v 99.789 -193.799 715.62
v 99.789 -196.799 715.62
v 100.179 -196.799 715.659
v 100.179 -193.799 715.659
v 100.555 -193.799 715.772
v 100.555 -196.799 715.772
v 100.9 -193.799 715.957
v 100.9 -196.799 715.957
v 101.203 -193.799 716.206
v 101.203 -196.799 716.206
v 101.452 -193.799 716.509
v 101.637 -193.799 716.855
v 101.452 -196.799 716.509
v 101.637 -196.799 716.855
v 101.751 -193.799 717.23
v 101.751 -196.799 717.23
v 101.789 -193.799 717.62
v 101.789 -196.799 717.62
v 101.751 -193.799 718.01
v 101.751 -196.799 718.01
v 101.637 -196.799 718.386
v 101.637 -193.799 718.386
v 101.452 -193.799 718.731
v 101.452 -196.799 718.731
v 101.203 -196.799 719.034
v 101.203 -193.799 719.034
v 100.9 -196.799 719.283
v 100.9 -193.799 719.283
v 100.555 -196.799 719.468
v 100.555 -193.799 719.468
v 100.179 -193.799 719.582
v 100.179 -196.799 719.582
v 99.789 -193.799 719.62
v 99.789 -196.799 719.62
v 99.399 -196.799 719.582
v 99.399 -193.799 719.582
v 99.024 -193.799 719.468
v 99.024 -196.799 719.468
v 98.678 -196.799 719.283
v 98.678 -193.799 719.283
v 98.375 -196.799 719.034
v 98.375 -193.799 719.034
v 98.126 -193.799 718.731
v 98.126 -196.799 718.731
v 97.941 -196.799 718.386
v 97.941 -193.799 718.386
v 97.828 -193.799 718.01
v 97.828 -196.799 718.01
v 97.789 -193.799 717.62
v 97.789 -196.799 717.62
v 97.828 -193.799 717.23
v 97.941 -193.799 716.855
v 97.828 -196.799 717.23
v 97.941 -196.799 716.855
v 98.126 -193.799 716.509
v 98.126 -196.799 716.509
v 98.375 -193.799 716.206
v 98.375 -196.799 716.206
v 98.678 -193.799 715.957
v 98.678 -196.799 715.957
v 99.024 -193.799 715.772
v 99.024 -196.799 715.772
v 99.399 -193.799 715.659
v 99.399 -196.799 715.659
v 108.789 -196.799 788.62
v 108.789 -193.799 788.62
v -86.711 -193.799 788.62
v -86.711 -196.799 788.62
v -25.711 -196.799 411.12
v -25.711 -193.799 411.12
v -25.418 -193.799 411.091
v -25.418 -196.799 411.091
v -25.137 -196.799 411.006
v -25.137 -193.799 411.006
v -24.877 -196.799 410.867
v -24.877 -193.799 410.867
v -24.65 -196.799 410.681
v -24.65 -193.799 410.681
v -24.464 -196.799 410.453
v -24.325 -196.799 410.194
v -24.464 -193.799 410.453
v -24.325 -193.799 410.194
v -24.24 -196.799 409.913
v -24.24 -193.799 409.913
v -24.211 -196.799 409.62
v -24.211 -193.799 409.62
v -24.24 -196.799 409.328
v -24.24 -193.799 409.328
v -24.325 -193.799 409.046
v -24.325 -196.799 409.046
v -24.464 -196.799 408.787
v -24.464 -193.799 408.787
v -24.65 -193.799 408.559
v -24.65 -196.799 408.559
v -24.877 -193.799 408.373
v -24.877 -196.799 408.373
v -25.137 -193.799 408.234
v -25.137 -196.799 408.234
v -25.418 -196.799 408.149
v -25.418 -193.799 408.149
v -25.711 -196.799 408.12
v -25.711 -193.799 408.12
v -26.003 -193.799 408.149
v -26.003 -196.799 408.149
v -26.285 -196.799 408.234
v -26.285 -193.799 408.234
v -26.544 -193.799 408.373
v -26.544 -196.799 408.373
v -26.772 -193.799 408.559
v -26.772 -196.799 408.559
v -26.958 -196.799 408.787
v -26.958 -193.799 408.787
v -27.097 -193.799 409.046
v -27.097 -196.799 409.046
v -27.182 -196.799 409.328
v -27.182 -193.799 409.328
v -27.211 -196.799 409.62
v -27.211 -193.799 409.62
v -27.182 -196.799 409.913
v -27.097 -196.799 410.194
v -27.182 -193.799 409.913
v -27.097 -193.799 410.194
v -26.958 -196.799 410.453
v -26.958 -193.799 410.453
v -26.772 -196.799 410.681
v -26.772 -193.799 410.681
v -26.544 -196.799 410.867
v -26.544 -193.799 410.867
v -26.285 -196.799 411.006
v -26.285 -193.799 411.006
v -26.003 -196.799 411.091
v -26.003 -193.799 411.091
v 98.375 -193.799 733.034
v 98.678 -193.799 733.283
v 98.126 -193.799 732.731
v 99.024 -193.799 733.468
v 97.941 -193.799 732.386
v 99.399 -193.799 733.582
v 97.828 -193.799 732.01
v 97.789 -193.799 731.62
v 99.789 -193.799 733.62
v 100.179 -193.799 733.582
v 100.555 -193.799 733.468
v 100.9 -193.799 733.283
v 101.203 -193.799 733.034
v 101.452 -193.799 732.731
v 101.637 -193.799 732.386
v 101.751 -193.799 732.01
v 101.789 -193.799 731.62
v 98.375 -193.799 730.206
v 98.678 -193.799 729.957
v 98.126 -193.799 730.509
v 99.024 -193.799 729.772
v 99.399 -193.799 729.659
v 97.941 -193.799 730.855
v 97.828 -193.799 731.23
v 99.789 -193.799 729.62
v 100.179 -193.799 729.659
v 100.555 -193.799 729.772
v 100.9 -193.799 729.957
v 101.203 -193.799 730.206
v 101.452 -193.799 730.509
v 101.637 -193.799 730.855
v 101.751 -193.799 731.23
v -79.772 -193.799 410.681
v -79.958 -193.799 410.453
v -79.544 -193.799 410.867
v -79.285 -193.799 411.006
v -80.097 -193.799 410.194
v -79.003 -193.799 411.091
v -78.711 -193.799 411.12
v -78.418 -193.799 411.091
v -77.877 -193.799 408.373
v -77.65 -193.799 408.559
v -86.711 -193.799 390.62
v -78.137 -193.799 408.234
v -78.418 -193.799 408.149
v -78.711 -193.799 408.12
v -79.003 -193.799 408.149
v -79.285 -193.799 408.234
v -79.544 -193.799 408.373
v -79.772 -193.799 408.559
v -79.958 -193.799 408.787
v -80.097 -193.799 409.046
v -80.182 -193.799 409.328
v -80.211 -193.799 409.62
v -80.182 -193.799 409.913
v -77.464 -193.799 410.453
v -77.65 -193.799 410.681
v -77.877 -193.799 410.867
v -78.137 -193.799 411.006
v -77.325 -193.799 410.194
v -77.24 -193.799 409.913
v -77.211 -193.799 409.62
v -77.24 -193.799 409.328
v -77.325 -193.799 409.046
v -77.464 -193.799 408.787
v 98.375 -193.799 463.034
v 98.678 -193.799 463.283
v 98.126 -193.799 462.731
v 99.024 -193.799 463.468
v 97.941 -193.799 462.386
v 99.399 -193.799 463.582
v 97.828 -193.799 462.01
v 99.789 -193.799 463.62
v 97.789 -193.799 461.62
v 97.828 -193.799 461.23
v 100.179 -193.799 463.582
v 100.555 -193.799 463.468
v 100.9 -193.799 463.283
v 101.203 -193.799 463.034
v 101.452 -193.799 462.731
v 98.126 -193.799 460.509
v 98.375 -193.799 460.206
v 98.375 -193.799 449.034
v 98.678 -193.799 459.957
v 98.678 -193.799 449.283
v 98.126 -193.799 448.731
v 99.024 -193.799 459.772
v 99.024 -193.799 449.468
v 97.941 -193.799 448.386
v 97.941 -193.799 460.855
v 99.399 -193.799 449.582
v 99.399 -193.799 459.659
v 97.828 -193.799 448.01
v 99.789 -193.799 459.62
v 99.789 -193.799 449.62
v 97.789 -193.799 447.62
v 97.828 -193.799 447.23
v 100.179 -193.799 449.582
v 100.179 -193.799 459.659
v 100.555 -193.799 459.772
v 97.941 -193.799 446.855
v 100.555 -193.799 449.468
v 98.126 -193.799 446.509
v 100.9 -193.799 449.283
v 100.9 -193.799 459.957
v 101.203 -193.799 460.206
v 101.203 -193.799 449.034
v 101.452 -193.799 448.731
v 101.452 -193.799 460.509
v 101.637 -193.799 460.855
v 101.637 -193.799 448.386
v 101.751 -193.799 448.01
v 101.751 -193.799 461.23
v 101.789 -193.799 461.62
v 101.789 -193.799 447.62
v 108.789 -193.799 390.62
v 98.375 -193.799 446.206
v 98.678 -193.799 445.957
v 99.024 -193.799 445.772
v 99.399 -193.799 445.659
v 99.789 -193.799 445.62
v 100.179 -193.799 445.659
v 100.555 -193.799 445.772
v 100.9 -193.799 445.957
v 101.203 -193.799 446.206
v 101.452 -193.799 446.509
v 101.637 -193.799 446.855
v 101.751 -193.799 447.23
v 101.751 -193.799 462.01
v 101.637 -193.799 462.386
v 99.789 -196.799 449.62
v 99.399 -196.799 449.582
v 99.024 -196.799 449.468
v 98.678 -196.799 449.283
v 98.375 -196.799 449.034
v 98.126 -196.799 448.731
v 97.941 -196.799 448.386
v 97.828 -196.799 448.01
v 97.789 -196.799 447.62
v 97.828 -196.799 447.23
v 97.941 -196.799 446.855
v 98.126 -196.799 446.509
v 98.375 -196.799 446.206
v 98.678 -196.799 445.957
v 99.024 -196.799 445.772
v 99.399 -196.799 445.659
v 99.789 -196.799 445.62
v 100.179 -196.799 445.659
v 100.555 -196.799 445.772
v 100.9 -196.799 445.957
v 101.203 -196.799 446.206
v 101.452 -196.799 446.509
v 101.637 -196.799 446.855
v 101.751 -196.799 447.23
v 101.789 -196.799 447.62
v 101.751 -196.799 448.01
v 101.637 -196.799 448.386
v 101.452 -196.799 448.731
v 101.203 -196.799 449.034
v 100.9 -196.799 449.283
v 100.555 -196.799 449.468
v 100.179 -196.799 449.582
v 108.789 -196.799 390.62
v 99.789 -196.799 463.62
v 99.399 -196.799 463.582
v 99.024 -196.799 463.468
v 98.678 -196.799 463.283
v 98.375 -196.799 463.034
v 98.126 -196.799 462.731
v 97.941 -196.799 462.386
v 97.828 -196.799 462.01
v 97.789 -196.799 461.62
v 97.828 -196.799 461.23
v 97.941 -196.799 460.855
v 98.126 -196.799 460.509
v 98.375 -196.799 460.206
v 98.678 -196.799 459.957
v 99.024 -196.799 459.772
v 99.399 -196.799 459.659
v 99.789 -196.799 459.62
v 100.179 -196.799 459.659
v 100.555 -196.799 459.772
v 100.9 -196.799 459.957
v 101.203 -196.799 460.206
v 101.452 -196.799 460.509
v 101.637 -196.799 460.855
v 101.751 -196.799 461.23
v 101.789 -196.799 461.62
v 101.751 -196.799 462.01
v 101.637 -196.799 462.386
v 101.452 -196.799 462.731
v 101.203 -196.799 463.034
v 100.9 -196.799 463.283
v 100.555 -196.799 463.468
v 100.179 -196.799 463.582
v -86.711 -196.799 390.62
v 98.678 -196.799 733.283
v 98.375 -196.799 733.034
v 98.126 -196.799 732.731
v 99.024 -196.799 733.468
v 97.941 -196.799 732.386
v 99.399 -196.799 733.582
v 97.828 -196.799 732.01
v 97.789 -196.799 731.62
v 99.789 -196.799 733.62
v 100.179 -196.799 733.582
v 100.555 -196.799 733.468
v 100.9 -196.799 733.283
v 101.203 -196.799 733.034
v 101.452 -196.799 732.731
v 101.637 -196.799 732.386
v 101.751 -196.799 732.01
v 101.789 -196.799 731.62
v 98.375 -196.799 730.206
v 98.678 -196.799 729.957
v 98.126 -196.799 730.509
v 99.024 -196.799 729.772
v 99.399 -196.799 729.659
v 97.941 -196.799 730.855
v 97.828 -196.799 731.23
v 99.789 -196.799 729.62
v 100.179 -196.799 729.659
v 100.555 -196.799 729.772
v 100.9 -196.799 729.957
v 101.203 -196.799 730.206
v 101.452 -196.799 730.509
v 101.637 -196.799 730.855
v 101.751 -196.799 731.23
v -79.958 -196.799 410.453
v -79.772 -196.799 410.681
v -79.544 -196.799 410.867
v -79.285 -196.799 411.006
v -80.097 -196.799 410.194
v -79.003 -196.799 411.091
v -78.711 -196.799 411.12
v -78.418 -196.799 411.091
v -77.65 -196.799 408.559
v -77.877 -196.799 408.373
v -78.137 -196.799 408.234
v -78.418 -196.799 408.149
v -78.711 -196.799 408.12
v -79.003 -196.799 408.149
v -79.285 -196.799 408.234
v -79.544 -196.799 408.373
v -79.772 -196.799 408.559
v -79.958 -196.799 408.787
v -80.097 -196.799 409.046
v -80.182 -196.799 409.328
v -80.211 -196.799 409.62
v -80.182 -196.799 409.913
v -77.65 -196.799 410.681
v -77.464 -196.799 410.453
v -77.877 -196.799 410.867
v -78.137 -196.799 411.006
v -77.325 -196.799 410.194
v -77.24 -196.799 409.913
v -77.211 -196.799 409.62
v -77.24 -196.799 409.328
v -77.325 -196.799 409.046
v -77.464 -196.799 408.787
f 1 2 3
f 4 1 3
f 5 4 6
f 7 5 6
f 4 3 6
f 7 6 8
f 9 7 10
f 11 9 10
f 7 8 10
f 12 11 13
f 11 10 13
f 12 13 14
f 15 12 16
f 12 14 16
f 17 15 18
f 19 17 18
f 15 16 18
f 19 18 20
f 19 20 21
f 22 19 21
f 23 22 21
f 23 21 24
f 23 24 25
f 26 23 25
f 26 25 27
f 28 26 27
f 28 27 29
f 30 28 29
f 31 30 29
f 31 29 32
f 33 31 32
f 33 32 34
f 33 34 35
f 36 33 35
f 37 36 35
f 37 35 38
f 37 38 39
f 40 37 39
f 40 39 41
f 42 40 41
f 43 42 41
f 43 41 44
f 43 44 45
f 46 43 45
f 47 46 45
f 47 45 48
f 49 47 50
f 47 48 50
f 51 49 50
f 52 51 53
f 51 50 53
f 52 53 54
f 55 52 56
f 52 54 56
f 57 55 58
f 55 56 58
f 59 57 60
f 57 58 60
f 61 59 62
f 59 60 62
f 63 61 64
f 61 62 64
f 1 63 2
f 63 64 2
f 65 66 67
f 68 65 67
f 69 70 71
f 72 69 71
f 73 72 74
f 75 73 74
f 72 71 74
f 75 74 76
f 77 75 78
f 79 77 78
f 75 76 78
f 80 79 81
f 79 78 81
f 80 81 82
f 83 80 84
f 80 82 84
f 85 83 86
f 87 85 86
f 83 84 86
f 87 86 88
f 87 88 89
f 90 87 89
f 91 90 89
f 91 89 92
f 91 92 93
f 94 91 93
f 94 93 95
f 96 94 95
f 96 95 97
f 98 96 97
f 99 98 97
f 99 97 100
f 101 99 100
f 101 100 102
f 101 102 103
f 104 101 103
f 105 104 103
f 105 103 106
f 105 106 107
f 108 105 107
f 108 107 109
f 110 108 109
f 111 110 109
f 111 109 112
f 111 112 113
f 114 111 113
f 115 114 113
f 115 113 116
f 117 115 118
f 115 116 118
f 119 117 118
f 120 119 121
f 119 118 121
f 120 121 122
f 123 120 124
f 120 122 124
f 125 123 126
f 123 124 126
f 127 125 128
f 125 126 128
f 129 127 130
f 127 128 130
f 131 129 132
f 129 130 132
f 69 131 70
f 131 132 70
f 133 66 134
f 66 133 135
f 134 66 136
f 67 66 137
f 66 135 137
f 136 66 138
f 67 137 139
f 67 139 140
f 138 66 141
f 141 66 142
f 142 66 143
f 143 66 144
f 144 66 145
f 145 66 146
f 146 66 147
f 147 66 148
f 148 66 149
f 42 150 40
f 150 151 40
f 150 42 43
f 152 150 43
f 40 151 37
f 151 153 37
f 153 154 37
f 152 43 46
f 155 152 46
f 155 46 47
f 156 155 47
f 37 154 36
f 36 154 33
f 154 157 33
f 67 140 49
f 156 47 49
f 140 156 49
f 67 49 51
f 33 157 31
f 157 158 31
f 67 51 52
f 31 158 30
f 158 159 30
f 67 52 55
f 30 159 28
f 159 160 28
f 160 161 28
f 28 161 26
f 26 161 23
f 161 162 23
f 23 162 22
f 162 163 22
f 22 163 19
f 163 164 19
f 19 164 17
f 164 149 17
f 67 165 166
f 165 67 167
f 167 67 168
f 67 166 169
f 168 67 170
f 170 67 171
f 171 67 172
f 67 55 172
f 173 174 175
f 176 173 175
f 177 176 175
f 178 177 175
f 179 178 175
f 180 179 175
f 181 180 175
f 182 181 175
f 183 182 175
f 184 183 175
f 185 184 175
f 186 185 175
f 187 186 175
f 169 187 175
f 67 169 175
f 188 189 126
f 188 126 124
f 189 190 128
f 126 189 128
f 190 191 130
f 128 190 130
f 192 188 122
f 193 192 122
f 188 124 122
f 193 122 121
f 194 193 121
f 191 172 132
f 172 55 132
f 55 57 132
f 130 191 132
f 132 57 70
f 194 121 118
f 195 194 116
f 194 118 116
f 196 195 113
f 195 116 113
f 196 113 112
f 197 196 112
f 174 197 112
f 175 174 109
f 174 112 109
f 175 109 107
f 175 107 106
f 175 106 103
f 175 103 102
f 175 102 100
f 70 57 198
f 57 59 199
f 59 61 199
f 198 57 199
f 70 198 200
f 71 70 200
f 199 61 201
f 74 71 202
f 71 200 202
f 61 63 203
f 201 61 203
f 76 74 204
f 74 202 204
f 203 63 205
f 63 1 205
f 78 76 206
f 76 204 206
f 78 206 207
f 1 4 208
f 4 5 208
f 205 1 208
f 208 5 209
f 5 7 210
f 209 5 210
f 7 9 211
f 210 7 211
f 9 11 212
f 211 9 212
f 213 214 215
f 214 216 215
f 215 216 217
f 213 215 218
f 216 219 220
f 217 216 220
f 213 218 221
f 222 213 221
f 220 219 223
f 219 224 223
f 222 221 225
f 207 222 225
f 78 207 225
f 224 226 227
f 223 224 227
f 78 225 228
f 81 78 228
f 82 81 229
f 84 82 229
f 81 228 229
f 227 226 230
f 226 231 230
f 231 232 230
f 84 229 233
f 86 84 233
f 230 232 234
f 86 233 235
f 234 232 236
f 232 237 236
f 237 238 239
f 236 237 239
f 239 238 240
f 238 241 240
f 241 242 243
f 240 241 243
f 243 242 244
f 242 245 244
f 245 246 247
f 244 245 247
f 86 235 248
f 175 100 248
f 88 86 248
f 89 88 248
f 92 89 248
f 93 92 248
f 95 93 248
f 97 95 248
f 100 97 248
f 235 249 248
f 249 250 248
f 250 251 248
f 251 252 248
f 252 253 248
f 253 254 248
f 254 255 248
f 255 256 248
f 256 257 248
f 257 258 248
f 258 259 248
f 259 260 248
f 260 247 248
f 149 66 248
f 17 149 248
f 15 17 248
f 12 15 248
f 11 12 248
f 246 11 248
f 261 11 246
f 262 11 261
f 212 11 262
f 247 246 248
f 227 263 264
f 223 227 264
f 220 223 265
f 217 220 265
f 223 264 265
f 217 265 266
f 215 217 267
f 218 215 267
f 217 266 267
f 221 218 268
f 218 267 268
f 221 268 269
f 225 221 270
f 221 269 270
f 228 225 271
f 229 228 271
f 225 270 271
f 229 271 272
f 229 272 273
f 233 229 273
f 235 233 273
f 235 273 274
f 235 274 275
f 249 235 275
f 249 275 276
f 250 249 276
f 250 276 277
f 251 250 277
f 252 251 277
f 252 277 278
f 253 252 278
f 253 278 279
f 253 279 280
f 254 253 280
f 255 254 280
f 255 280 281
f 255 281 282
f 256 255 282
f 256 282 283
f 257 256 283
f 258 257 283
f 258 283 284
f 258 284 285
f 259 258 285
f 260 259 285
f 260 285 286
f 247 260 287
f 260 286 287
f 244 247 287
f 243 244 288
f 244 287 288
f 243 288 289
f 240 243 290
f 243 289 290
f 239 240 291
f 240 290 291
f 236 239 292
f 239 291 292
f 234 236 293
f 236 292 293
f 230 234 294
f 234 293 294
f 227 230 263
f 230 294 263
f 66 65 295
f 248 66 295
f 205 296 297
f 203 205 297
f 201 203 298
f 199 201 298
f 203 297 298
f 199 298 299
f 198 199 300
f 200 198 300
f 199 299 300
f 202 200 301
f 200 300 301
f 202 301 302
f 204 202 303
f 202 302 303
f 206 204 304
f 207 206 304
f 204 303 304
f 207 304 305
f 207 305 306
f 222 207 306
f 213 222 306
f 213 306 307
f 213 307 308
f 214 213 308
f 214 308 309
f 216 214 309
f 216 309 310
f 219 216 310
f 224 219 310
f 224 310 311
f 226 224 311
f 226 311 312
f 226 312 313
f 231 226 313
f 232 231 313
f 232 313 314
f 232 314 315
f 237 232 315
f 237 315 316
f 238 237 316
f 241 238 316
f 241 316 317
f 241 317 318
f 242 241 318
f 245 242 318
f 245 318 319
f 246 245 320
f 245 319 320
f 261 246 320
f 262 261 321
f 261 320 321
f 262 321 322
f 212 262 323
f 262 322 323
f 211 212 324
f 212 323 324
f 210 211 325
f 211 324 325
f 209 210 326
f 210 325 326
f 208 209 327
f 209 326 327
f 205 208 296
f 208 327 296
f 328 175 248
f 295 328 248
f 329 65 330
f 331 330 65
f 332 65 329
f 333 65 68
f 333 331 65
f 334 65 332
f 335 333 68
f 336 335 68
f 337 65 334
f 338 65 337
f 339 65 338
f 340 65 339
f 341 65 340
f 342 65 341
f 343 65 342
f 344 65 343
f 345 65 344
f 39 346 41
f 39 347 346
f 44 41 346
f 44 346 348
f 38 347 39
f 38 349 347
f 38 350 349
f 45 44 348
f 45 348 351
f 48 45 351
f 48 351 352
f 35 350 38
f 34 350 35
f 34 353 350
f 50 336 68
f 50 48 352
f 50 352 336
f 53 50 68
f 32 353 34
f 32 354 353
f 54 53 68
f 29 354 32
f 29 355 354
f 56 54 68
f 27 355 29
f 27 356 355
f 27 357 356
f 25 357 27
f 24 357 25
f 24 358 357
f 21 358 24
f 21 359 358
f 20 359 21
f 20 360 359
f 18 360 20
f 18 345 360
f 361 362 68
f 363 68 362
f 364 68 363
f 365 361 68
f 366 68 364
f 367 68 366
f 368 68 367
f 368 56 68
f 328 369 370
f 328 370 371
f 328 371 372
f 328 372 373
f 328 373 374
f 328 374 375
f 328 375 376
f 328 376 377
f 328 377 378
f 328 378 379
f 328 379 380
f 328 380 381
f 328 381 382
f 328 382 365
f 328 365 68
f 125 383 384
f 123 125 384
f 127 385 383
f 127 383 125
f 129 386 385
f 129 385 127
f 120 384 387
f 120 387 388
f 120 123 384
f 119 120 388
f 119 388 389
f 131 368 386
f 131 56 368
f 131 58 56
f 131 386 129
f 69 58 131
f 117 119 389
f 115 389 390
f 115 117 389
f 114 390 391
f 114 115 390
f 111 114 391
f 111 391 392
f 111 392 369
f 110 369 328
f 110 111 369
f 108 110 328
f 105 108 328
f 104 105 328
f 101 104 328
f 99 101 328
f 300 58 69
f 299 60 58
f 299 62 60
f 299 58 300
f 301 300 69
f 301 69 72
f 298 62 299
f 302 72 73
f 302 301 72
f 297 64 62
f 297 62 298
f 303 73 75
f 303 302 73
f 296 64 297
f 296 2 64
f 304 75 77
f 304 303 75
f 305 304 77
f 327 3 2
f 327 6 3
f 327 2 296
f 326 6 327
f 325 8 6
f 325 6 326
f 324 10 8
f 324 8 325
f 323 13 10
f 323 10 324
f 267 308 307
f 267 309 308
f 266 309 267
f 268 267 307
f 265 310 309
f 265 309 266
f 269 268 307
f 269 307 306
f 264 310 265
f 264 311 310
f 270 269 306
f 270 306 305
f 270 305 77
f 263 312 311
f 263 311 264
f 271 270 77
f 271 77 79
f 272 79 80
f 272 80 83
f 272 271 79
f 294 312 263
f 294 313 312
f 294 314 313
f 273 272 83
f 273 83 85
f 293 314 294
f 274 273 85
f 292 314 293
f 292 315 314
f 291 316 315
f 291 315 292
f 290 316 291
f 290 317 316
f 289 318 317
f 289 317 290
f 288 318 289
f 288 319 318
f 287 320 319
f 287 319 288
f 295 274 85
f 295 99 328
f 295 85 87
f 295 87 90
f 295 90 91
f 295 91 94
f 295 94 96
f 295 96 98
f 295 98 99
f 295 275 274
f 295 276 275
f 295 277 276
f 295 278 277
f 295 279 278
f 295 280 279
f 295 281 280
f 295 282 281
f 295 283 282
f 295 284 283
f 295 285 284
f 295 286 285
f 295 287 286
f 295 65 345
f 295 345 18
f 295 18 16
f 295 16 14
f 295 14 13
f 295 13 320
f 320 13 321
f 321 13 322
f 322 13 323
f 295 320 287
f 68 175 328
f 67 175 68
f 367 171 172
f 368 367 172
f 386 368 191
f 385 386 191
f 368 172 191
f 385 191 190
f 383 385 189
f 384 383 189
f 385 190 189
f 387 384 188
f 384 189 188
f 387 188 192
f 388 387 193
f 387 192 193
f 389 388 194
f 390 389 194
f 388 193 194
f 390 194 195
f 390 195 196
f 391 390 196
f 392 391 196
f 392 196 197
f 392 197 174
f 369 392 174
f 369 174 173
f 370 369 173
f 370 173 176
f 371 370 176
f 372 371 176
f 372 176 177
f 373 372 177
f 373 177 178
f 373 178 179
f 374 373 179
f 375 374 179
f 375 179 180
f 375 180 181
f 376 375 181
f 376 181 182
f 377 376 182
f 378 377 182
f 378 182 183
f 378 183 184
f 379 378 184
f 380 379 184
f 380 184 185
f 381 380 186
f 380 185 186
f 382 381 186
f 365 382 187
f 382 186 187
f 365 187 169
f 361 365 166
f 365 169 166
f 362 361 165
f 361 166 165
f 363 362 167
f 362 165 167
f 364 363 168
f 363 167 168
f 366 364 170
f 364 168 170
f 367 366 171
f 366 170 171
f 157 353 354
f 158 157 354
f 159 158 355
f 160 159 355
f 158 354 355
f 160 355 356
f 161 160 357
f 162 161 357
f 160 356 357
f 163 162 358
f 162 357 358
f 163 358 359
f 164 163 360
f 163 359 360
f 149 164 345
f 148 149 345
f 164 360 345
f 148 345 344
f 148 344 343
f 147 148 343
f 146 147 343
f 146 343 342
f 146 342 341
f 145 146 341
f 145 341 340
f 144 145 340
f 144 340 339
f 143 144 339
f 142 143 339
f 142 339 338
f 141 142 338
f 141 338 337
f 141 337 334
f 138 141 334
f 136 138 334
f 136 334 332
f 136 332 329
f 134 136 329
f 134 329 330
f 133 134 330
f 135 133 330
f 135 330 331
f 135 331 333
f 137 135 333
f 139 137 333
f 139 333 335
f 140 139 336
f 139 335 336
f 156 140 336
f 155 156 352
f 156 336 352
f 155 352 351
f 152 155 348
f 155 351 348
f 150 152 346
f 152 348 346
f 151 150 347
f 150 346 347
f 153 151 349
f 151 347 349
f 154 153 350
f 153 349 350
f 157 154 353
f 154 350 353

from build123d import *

# Parameters (mm, degrees)
SKETCH1_W           = 193
SKETCH1_H           = 400
BOSS_EXTRUDE1_DEPTH = 3
SKETCH2_R           = 1.5
CUT_EXTRUDE1_DEPTH  = 10
SKETCH3_R           = 2
CUT_EXTRUDE2_DEPTH  = 10
SKETCH4_W           = 248.590702278
SKETCH4_H           = 43.310012617
CUT_EXTRUDE3_DEPTH  = 1
SKETCH5_W           = 316.199587927
SKETCH5_H           = 81.961296772
CUT_EXTRUDE4_DEPTH  = 1
THICKEN1_T1         = 3
SKETCH6_W           = 457.051709452
SKETCH6_H           = 116.920204743
CUT_EXTRUDE5_DEPTH  = 0.5


with BuildPart() as part:
    # Sketch1 → Boss-Extrude1 (new body)
    with BuildSketch(Plane(origin=(0, -196.798939869, 0), x_dir=(1, 0, 0), z_dir=(0, 1, 0))):
        with Locations((9.289156386, -589.620141885)):
            Rectangle(SKETCH1_W, SKETCH1_H)
    extrude(amount=BOSS_EXTRUDE1_DEPTH)

    # Sketch2 → Cut-Extrude1 (cut)
    with BuildSketch(Plane(origin=(0, -193.798939869, 0), x_dir=(1, 0, 0), z_dir=(0, 1, 0))):
        with Locations(Location((-78.710843614, -409.620141885, 0), (0, 0, 270))):
            Circle(SKETCH2_R)
        with Locations(Location((-25.710843614, -409.620141885, 0), (0, 0, 270))):
            Circle(SKETCH2_R)
    extrude(amount=-CUT_EXTRUDE1_DEPTH, mode=Mode.SUBTRACT)

    # Sketch3 → Cut-Extrude2 (cut)
    with BuildSketch(Plane.XZ.offset(196.798939869)):
        with Locations(Location((99.789156386, 731.620141885, 0), (0, 0, 270))):
            Circle(SKETCH3_R)
        with Locations(Location((99.789156386, 717.620141885, 0), (0, 0, 270))):
            Circle(SKETCH3_R)
        with Locations(Location((99.789156386, 461.620141885, 0), (0, 0, 90))):
            Circle(SKETCH3_R)
        with Locations(Location((99.789156386, 447.620141885, 0), (0, 0, 90))):
            Circle(SKETCH3_R)
    extrude(amount=-CUT_EXTRUDE2_DEPTH, mode=Mode.SUBTRACT)

    # Sketch4 → Cut-Extrude3 (cut)
    with BuildSketch(Plane.XY.offset(789.620141885)):
        with Locations((-1.481434532, -204.805293431)):
            Rectangle(SKETCH4_W, SKETCH4_H)
    extrude(amount=-CUT_EXTRUDE3_DEPTH, mode=Mode.SUBTRACT)

    # Sketch5 → Cut-Extrude4 (cut)
    with BuildSketch(Plane(origin=(0, 0, 389.620141885), x_dir=(-1, 0, 0), z_dir=(0, 0, -1))):
        with Locations((-28.05964404, -177.05881152)):
            Rectangle(SKETCH5_W, SKETCH5_H)
    extrude(amount=-CUT_EXTRUDE4_DEPTH, mode=Mode.SUBTRACT)

    # Surface-Offset1: a surface, a copy of 1 face of the part
    surface_offset1_1 = part.part.faces().sort_by_distance((105.789156386, -195.298939869, 589.620141885))[0]
    add(Solid.thicken(surface_offset1_1, THICKEN1_T1))

    # Sketch6 → Cut-Extrude5 (cut)
    with BuildSketch(Plane.ZY.offset(87.210843614)):
        with Locations((584.748466687, -192.863102271)):
            Rectangle(SKETCH6_W, SKETCH6_H)
    extrude(amount=-CUT_EXTRUDE5_DEPTH, mode=Mode.SUBTRACT)


solid = part.part
